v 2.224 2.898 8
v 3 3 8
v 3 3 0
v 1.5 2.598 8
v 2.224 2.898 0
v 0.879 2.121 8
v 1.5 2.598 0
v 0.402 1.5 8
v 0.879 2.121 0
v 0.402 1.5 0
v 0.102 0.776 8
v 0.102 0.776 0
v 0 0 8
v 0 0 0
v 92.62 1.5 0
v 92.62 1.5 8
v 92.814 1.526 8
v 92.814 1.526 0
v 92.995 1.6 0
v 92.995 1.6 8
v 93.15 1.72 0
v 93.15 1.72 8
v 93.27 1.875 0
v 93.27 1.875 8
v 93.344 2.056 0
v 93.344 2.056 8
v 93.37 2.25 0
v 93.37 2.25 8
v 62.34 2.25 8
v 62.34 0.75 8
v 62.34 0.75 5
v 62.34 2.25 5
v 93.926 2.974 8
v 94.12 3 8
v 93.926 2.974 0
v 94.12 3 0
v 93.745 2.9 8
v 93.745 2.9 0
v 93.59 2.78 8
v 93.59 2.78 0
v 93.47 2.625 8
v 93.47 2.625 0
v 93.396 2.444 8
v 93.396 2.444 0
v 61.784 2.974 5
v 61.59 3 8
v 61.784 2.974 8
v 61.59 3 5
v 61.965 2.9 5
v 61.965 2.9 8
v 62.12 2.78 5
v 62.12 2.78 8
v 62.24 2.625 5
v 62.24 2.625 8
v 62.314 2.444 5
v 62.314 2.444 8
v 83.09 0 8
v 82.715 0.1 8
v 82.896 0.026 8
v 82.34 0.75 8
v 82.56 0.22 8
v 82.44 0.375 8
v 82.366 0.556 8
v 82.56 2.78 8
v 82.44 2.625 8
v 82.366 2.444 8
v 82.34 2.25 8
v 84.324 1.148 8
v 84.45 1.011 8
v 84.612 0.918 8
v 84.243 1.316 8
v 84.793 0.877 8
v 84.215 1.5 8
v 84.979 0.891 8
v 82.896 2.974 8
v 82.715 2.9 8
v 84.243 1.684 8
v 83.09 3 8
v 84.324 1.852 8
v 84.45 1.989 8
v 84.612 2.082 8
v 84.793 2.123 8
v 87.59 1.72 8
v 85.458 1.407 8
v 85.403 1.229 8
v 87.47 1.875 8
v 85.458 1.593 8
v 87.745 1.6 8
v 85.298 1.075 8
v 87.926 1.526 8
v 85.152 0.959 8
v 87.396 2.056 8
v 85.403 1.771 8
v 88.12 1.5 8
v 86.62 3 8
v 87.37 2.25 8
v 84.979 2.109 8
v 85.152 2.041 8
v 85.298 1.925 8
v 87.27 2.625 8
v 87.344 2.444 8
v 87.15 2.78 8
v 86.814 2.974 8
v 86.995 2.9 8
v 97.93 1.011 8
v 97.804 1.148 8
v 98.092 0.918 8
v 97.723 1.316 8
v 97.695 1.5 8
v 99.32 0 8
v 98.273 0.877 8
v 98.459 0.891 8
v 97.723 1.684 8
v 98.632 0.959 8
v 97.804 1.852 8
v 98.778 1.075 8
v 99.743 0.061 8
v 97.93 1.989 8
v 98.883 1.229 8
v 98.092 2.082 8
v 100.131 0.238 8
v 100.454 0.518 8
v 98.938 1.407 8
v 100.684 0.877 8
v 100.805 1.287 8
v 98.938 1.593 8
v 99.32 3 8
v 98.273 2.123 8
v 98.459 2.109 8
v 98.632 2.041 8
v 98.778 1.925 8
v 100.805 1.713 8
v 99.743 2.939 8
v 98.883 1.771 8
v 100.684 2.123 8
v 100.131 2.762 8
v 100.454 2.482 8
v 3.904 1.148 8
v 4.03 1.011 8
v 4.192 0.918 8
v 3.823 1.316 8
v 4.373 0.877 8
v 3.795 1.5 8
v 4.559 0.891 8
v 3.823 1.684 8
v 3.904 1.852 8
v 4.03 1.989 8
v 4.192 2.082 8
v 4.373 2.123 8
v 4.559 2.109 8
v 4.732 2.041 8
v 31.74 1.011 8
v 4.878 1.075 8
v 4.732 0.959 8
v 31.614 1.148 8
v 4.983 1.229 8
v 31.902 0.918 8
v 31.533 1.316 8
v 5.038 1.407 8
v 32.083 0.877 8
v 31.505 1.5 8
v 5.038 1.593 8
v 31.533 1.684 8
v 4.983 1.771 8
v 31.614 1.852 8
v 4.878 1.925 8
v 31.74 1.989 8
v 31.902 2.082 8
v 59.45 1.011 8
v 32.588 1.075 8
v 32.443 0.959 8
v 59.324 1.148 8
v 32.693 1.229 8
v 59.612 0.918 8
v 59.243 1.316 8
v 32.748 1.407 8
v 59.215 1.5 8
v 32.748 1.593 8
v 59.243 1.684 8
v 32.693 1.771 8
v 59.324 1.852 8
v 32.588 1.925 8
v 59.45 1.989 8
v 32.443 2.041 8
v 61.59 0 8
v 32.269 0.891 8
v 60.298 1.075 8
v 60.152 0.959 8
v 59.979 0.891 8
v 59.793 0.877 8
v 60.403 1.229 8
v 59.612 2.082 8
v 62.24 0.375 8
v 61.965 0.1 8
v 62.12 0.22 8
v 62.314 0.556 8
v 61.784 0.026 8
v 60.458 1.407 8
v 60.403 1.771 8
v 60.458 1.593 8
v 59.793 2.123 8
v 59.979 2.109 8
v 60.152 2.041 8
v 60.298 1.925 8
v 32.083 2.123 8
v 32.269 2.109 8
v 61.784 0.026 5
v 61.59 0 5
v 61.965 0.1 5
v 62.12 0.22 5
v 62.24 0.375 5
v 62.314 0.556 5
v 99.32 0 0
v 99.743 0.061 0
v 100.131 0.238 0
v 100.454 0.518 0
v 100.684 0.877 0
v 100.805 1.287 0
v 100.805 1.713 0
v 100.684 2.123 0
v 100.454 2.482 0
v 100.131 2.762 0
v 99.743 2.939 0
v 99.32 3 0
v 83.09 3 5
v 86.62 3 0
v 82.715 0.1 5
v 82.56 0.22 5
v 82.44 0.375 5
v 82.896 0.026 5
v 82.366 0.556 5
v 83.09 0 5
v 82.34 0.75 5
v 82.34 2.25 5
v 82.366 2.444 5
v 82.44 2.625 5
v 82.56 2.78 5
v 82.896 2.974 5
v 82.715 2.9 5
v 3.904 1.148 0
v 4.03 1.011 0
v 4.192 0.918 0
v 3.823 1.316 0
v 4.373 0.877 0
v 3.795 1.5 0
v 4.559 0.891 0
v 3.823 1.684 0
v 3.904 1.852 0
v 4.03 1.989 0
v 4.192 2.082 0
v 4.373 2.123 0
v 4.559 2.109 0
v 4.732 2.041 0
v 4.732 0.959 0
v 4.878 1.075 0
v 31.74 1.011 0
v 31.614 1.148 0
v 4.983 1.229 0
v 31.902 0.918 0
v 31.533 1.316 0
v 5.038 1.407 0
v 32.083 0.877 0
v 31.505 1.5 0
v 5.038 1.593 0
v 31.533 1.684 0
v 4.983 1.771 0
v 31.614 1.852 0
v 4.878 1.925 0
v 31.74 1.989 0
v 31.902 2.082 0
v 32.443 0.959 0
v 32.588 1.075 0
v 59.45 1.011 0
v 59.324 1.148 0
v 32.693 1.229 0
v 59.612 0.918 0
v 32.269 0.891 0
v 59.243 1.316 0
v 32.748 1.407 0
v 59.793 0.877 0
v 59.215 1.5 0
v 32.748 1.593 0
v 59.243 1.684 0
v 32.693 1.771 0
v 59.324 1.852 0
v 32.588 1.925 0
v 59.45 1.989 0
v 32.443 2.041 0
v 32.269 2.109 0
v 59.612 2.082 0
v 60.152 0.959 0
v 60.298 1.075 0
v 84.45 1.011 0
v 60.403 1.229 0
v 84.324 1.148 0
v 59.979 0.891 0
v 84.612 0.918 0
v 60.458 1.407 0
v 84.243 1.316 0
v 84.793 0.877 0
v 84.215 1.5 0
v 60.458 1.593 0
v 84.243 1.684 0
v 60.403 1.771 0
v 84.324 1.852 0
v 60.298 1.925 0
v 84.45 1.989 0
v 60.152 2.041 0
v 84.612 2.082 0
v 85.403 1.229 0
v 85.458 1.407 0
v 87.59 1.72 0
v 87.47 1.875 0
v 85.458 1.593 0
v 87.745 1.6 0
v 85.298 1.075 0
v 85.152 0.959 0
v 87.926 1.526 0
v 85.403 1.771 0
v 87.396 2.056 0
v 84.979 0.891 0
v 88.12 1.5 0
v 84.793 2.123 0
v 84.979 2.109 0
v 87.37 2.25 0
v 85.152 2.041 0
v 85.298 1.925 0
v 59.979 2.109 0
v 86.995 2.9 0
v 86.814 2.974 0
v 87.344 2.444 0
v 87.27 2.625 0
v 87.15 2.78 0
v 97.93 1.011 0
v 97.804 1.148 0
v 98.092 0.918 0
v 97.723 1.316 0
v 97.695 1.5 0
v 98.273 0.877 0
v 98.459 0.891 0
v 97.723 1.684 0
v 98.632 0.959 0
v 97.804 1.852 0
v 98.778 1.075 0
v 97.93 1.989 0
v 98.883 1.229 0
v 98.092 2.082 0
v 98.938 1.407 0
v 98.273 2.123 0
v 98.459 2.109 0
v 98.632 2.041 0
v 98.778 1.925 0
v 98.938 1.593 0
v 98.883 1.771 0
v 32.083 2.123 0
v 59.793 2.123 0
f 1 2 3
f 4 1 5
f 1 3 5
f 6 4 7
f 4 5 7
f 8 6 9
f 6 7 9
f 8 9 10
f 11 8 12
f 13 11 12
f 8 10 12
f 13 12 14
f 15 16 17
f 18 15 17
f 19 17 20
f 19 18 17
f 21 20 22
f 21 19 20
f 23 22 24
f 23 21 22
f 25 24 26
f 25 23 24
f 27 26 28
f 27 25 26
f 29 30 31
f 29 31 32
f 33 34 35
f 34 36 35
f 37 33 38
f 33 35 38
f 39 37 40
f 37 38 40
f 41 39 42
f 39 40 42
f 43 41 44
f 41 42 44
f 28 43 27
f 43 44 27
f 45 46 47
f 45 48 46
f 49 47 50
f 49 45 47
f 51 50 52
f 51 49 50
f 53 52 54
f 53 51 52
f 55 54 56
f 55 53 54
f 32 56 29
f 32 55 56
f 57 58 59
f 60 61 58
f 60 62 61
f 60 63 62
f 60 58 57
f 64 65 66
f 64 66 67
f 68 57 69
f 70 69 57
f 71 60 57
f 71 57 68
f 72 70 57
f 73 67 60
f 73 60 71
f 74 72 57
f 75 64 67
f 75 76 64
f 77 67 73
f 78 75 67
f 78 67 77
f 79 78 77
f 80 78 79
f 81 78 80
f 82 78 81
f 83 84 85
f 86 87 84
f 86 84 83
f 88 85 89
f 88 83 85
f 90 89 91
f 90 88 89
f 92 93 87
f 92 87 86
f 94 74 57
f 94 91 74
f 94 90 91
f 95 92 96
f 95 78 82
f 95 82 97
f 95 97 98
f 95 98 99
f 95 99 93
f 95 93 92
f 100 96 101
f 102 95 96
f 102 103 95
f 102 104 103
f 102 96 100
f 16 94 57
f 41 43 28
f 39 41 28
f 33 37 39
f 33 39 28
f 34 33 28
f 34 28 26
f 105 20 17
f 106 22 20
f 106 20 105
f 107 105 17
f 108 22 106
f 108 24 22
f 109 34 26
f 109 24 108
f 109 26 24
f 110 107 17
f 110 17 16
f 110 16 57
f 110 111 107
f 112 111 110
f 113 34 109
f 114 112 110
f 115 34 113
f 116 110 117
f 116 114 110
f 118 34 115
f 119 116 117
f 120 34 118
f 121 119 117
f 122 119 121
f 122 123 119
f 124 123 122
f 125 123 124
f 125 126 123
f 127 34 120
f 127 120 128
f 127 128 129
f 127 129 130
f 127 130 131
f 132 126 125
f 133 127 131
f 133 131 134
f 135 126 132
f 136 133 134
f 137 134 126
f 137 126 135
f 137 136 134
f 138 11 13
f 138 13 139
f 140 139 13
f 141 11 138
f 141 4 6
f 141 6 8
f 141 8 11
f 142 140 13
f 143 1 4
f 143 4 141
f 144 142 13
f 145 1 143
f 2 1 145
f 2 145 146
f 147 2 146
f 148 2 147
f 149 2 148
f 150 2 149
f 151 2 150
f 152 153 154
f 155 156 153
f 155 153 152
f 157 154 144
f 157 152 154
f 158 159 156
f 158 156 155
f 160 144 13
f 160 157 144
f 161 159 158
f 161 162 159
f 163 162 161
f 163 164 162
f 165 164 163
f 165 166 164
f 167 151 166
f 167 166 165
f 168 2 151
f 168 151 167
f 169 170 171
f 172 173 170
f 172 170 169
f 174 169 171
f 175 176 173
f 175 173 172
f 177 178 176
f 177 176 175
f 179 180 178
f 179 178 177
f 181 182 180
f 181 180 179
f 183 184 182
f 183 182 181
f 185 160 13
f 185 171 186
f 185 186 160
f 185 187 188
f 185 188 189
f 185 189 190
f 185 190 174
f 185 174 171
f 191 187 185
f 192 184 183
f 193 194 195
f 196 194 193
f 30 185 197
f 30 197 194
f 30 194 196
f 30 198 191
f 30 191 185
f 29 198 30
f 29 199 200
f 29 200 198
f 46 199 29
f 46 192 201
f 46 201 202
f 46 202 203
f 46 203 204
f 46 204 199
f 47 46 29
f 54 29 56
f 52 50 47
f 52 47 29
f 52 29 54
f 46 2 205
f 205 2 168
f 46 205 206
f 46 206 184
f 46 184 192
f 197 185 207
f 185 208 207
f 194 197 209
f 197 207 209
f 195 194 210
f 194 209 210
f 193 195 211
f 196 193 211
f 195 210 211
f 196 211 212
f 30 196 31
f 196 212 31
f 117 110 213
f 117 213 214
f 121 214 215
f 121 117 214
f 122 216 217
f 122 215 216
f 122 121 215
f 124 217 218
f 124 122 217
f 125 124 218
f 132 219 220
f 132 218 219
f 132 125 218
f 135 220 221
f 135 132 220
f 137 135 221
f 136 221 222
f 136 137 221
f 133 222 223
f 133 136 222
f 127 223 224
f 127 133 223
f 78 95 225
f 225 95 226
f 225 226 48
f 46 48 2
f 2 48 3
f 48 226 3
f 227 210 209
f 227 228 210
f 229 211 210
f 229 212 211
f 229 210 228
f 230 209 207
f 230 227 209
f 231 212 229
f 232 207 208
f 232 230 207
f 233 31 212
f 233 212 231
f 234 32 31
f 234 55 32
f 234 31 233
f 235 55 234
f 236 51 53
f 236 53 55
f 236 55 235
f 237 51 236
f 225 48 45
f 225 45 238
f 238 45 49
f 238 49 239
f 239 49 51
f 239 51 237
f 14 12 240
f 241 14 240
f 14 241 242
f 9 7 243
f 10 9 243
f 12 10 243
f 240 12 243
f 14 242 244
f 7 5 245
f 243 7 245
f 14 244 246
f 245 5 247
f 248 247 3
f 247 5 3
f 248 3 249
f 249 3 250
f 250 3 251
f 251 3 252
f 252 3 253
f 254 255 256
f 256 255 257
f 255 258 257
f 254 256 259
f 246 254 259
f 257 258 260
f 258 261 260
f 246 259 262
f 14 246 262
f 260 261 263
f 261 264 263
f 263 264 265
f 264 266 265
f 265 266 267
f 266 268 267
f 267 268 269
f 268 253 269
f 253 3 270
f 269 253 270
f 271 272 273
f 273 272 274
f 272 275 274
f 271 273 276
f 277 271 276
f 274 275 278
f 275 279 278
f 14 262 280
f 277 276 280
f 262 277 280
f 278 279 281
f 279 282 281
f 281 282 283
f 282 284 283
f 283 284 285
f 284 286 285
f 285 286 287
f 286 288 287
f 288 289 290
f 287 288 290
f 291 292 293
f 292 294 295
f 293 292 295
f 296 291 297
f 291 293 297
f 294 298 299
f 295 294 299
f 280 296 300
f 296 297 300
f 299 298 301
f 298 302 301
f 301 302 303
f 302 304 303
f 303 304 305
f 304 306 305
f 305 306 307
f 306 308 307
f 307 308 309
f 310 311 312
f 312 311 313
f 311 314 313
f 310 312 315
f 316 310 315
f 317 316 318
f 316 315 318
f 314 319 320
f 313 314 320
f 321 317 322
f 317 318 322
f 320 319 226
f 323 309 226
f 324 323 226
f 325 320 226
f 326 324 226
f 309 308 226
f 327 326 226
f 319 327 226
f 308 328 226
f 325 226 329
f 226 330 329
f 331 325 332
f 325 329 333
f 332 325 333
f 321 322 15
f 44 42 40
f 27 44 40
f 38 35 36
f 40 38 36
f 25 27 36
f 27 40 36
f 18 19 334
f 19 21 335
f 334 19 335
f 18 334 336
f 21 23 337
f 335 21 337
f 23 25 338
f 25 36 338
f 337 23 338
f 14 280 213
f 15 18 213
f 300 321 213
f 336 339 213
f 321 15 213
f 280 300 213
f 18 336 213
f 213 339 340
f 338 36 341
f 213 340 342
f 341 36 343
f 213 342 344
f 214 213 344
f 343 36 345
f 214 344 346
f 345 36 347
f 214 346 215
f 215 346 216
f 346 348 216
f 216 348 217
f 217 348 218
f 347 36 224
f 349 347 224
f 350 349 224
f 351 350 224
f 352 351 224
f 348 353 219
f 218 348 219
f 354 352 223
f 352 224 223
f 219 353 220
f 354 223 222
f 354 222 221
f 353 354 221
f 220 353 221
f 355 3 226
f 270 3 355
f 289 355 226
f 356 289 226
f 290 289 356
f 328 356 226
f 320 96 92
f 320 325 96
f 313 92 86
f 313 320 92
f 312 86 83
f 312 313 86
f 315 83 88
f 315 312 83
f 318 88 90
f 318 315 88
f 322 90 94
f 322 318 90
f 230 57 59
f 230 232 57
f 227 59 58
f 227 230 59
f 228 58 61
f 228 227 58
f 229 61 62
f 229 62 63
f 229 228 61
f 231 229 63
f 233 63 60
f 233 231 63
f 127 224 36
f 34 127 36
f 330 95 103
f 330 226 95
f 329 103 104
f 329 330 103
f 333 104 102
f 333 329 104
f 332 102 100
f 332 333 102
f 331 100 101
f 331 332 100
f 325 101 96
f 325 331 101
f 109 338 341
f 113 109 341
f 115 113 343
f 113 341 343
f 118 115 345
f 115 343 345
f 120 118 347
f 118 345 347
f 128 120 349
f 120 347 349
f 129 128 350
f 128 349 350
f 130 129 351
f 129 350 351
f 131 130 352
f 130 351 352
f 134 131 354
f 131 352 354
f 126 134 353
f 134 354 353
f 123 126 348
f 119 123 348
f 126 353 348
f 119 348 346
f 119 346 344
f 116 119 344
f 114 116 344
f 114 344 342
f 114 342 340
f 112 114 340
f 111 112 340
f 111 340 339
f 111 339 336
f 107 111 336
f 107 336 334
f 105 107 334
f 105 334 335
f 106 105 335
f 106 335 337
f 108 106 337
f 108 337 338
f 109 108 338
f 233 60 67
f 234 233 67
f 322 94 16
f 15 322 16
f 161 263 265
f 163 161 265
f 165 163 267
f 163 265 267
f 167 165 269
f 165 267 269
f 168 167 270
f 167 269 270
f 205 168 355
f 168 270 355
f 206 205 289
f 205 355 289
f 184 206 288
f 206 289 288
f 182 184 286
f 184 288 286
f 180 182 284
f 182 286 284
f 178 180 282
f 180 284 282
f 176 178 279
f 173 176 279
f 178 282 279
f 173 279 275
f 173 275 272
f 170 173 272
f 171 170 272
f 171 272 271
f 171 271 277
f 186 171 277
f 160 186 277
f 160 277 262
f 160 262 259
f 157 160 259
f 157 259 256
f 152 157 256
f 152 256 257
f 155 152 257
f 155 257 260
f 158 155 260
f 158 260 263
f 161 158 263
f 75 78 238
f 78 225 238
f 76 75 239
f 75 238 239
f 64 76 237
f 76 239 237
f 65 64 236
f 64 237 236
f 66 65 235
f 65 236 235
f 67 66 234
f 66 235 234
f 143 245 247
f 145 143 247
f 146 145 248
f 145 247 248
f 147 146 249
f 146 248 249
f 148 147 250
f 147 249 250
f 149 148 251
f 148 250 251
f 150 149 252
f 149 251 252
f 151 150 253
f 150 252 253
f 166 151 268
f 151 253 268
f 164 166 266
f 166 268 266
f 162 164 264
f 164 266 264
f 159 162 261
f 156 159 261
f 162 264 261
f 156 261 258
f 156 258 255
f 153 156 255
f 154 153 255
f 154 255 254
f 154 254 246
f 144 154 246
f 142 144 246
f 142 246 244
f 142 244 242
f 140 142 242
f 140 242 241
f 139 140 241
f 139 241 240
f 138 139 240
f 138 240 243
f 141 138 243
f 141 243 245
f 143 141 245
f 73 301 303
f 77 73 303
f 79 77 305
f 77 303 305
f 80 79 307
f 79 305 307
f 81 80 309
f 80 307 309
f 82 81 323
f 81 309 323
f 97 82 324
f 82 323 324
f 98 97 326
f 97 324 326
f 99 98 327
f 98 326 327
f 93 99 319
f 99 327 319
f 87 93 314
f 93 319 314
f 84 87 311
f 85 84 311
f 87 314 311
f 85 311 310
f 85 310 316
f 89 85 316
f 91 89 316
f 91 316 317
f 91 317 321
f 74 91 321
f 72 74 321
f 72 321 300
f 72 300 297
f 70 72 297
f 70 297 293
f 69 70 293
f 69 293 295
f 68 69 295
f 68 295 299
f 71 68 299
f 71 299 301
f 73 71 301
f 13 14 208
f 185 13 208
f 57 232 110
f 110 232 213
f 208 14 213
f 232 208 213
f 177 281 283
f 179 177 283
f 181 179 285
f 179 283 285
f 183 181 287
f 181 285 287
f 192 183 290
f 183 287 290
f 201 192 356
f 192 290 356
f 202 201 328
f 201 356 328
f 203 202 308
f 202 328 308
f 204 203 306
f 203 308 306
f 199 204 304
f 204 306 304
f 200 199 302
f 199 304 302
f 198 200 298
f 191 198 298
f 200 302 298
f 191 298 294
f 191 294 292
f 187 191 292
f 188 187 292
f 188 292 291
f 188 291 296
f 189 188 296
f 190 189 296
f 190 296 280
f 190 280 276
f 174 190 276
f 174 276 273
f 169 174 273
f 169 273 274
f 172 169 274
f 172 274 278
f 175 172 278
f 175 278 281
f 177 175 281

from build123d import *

# Parameters (mm, degrees)
EXTRUDE_854_DEPTH      = 8
SKETCH_2_W             = 20
SKETCH_2_H             = 3
CUT_EXTRUDE_1137_DEPTH = 3
HOLE_WIZARD_1_6_D      = 1.25
SKETCH_7_W             = 6
SKETCH_7_H             = 1.5
CUT_EXTRUDE_2764_DEPTH = 102.181383663
FILLET_2_RADIUS        = 1.5
FILLET_2_LENGTH        = 8
FILLET_3_R             = 0.75


with BuildPart() as part:
    # Model → Extrude 854 (new body)
    with BuildSketch(Plane.XY):
        with BuildLine():
            Line((100.82, 3), (3, 3))
            ThreePointArc((3, 3), (0.878679656, 2.121320344), (0, 0))
            Line((0, 0), (100.82, 0))
            Line((100.82, 0), (100.82, 3))
        make_face()
    extrude(amount=EXTRUDE_854_DEPTH)

    # Эскиз2 → Cut-Extrude 1137 (cut)
    with BuildSketch(Plane.XY.offset(8)):
        with Locations((72.34, 1.5)):
            Rectangle(SKETCH_2_W, SKETCH_2_H)
    extrude(amount=-CUT_EXTRUDE_1137_DEPTH, mode=Mode.SUBTRACT)

    # Резьба М1.6 (through all)
    with Locations(Plane.XY.offset(8)):
        with Locations((4.42, 1.5), (59.84, 1.5), (84.84, 1.5), (98.32, 1.5), (32.13, 1.5)):
            Hole(HOLE_WIZARD_1_6_D / 2)

    # Эскиз7 → Cut-Extrude 2764 (cut, through all)
    with BuildSketch(Plane.XY.offset(8)):
        with Locations((90.37, 2.25)):
            Rectangle(SKETCH_7_W, SKETCH_7_H)
    extrude(amount=-CUT_EXTRUDE_2764_DEPTH, mode=Mode.SUBTRACT)

    # Скругление2: full round fillet: the end face becomes a half cylinder, R = half its width
    fillet_2_face = Plane((100.82, 1.5, 4), x_dir=(0, 0, 1), z_dir=(1, 0, 0))  # on the end face: x along it, z out of the body
    fillet_2_slab = fillet_2_face.offset(-FILLET_2_RADIUS / 2) * Box(FILLET_2_LENGTH, 2 * FILLET_2_RADIUS, FILLET_2_RADIUS, mode=Mode.PRIVATE)  # the body's end, R deep
    fillet_2_round = Plane((99.32, 1.5, 4), x_dir=(1, 0, 0), z_dir=(0, 0, 1)) * Cylinder(FILLET_2_RADIUS, FILLET_2_LENGTH, mode=Mode.PRIVATE)  # its axis R under the face
    add(fillet_2_slab - fillet_2_round, mode=Mode.SUBTRACT)

    # Скругление3
    fillet_3_edges = [part.edges().sort_by_distance(p)[0] for p in [
        (62.34, 0, 6.5),
        (82.34, 0, 6.5),
        (93.37, 1.5, 4),
        (93.37, 3, 4),
        (87.37, 1.5, 4),
        (87.37, 3, 4),
        (82.34, 3, 6.5),
        (62.34, 3, 6.5),
    ]]
    fillet(fillet_3_edges, radius=FILLET_3_R - 0.0001)  # a hair under: the kernel refuses the full size


solid = part.part
